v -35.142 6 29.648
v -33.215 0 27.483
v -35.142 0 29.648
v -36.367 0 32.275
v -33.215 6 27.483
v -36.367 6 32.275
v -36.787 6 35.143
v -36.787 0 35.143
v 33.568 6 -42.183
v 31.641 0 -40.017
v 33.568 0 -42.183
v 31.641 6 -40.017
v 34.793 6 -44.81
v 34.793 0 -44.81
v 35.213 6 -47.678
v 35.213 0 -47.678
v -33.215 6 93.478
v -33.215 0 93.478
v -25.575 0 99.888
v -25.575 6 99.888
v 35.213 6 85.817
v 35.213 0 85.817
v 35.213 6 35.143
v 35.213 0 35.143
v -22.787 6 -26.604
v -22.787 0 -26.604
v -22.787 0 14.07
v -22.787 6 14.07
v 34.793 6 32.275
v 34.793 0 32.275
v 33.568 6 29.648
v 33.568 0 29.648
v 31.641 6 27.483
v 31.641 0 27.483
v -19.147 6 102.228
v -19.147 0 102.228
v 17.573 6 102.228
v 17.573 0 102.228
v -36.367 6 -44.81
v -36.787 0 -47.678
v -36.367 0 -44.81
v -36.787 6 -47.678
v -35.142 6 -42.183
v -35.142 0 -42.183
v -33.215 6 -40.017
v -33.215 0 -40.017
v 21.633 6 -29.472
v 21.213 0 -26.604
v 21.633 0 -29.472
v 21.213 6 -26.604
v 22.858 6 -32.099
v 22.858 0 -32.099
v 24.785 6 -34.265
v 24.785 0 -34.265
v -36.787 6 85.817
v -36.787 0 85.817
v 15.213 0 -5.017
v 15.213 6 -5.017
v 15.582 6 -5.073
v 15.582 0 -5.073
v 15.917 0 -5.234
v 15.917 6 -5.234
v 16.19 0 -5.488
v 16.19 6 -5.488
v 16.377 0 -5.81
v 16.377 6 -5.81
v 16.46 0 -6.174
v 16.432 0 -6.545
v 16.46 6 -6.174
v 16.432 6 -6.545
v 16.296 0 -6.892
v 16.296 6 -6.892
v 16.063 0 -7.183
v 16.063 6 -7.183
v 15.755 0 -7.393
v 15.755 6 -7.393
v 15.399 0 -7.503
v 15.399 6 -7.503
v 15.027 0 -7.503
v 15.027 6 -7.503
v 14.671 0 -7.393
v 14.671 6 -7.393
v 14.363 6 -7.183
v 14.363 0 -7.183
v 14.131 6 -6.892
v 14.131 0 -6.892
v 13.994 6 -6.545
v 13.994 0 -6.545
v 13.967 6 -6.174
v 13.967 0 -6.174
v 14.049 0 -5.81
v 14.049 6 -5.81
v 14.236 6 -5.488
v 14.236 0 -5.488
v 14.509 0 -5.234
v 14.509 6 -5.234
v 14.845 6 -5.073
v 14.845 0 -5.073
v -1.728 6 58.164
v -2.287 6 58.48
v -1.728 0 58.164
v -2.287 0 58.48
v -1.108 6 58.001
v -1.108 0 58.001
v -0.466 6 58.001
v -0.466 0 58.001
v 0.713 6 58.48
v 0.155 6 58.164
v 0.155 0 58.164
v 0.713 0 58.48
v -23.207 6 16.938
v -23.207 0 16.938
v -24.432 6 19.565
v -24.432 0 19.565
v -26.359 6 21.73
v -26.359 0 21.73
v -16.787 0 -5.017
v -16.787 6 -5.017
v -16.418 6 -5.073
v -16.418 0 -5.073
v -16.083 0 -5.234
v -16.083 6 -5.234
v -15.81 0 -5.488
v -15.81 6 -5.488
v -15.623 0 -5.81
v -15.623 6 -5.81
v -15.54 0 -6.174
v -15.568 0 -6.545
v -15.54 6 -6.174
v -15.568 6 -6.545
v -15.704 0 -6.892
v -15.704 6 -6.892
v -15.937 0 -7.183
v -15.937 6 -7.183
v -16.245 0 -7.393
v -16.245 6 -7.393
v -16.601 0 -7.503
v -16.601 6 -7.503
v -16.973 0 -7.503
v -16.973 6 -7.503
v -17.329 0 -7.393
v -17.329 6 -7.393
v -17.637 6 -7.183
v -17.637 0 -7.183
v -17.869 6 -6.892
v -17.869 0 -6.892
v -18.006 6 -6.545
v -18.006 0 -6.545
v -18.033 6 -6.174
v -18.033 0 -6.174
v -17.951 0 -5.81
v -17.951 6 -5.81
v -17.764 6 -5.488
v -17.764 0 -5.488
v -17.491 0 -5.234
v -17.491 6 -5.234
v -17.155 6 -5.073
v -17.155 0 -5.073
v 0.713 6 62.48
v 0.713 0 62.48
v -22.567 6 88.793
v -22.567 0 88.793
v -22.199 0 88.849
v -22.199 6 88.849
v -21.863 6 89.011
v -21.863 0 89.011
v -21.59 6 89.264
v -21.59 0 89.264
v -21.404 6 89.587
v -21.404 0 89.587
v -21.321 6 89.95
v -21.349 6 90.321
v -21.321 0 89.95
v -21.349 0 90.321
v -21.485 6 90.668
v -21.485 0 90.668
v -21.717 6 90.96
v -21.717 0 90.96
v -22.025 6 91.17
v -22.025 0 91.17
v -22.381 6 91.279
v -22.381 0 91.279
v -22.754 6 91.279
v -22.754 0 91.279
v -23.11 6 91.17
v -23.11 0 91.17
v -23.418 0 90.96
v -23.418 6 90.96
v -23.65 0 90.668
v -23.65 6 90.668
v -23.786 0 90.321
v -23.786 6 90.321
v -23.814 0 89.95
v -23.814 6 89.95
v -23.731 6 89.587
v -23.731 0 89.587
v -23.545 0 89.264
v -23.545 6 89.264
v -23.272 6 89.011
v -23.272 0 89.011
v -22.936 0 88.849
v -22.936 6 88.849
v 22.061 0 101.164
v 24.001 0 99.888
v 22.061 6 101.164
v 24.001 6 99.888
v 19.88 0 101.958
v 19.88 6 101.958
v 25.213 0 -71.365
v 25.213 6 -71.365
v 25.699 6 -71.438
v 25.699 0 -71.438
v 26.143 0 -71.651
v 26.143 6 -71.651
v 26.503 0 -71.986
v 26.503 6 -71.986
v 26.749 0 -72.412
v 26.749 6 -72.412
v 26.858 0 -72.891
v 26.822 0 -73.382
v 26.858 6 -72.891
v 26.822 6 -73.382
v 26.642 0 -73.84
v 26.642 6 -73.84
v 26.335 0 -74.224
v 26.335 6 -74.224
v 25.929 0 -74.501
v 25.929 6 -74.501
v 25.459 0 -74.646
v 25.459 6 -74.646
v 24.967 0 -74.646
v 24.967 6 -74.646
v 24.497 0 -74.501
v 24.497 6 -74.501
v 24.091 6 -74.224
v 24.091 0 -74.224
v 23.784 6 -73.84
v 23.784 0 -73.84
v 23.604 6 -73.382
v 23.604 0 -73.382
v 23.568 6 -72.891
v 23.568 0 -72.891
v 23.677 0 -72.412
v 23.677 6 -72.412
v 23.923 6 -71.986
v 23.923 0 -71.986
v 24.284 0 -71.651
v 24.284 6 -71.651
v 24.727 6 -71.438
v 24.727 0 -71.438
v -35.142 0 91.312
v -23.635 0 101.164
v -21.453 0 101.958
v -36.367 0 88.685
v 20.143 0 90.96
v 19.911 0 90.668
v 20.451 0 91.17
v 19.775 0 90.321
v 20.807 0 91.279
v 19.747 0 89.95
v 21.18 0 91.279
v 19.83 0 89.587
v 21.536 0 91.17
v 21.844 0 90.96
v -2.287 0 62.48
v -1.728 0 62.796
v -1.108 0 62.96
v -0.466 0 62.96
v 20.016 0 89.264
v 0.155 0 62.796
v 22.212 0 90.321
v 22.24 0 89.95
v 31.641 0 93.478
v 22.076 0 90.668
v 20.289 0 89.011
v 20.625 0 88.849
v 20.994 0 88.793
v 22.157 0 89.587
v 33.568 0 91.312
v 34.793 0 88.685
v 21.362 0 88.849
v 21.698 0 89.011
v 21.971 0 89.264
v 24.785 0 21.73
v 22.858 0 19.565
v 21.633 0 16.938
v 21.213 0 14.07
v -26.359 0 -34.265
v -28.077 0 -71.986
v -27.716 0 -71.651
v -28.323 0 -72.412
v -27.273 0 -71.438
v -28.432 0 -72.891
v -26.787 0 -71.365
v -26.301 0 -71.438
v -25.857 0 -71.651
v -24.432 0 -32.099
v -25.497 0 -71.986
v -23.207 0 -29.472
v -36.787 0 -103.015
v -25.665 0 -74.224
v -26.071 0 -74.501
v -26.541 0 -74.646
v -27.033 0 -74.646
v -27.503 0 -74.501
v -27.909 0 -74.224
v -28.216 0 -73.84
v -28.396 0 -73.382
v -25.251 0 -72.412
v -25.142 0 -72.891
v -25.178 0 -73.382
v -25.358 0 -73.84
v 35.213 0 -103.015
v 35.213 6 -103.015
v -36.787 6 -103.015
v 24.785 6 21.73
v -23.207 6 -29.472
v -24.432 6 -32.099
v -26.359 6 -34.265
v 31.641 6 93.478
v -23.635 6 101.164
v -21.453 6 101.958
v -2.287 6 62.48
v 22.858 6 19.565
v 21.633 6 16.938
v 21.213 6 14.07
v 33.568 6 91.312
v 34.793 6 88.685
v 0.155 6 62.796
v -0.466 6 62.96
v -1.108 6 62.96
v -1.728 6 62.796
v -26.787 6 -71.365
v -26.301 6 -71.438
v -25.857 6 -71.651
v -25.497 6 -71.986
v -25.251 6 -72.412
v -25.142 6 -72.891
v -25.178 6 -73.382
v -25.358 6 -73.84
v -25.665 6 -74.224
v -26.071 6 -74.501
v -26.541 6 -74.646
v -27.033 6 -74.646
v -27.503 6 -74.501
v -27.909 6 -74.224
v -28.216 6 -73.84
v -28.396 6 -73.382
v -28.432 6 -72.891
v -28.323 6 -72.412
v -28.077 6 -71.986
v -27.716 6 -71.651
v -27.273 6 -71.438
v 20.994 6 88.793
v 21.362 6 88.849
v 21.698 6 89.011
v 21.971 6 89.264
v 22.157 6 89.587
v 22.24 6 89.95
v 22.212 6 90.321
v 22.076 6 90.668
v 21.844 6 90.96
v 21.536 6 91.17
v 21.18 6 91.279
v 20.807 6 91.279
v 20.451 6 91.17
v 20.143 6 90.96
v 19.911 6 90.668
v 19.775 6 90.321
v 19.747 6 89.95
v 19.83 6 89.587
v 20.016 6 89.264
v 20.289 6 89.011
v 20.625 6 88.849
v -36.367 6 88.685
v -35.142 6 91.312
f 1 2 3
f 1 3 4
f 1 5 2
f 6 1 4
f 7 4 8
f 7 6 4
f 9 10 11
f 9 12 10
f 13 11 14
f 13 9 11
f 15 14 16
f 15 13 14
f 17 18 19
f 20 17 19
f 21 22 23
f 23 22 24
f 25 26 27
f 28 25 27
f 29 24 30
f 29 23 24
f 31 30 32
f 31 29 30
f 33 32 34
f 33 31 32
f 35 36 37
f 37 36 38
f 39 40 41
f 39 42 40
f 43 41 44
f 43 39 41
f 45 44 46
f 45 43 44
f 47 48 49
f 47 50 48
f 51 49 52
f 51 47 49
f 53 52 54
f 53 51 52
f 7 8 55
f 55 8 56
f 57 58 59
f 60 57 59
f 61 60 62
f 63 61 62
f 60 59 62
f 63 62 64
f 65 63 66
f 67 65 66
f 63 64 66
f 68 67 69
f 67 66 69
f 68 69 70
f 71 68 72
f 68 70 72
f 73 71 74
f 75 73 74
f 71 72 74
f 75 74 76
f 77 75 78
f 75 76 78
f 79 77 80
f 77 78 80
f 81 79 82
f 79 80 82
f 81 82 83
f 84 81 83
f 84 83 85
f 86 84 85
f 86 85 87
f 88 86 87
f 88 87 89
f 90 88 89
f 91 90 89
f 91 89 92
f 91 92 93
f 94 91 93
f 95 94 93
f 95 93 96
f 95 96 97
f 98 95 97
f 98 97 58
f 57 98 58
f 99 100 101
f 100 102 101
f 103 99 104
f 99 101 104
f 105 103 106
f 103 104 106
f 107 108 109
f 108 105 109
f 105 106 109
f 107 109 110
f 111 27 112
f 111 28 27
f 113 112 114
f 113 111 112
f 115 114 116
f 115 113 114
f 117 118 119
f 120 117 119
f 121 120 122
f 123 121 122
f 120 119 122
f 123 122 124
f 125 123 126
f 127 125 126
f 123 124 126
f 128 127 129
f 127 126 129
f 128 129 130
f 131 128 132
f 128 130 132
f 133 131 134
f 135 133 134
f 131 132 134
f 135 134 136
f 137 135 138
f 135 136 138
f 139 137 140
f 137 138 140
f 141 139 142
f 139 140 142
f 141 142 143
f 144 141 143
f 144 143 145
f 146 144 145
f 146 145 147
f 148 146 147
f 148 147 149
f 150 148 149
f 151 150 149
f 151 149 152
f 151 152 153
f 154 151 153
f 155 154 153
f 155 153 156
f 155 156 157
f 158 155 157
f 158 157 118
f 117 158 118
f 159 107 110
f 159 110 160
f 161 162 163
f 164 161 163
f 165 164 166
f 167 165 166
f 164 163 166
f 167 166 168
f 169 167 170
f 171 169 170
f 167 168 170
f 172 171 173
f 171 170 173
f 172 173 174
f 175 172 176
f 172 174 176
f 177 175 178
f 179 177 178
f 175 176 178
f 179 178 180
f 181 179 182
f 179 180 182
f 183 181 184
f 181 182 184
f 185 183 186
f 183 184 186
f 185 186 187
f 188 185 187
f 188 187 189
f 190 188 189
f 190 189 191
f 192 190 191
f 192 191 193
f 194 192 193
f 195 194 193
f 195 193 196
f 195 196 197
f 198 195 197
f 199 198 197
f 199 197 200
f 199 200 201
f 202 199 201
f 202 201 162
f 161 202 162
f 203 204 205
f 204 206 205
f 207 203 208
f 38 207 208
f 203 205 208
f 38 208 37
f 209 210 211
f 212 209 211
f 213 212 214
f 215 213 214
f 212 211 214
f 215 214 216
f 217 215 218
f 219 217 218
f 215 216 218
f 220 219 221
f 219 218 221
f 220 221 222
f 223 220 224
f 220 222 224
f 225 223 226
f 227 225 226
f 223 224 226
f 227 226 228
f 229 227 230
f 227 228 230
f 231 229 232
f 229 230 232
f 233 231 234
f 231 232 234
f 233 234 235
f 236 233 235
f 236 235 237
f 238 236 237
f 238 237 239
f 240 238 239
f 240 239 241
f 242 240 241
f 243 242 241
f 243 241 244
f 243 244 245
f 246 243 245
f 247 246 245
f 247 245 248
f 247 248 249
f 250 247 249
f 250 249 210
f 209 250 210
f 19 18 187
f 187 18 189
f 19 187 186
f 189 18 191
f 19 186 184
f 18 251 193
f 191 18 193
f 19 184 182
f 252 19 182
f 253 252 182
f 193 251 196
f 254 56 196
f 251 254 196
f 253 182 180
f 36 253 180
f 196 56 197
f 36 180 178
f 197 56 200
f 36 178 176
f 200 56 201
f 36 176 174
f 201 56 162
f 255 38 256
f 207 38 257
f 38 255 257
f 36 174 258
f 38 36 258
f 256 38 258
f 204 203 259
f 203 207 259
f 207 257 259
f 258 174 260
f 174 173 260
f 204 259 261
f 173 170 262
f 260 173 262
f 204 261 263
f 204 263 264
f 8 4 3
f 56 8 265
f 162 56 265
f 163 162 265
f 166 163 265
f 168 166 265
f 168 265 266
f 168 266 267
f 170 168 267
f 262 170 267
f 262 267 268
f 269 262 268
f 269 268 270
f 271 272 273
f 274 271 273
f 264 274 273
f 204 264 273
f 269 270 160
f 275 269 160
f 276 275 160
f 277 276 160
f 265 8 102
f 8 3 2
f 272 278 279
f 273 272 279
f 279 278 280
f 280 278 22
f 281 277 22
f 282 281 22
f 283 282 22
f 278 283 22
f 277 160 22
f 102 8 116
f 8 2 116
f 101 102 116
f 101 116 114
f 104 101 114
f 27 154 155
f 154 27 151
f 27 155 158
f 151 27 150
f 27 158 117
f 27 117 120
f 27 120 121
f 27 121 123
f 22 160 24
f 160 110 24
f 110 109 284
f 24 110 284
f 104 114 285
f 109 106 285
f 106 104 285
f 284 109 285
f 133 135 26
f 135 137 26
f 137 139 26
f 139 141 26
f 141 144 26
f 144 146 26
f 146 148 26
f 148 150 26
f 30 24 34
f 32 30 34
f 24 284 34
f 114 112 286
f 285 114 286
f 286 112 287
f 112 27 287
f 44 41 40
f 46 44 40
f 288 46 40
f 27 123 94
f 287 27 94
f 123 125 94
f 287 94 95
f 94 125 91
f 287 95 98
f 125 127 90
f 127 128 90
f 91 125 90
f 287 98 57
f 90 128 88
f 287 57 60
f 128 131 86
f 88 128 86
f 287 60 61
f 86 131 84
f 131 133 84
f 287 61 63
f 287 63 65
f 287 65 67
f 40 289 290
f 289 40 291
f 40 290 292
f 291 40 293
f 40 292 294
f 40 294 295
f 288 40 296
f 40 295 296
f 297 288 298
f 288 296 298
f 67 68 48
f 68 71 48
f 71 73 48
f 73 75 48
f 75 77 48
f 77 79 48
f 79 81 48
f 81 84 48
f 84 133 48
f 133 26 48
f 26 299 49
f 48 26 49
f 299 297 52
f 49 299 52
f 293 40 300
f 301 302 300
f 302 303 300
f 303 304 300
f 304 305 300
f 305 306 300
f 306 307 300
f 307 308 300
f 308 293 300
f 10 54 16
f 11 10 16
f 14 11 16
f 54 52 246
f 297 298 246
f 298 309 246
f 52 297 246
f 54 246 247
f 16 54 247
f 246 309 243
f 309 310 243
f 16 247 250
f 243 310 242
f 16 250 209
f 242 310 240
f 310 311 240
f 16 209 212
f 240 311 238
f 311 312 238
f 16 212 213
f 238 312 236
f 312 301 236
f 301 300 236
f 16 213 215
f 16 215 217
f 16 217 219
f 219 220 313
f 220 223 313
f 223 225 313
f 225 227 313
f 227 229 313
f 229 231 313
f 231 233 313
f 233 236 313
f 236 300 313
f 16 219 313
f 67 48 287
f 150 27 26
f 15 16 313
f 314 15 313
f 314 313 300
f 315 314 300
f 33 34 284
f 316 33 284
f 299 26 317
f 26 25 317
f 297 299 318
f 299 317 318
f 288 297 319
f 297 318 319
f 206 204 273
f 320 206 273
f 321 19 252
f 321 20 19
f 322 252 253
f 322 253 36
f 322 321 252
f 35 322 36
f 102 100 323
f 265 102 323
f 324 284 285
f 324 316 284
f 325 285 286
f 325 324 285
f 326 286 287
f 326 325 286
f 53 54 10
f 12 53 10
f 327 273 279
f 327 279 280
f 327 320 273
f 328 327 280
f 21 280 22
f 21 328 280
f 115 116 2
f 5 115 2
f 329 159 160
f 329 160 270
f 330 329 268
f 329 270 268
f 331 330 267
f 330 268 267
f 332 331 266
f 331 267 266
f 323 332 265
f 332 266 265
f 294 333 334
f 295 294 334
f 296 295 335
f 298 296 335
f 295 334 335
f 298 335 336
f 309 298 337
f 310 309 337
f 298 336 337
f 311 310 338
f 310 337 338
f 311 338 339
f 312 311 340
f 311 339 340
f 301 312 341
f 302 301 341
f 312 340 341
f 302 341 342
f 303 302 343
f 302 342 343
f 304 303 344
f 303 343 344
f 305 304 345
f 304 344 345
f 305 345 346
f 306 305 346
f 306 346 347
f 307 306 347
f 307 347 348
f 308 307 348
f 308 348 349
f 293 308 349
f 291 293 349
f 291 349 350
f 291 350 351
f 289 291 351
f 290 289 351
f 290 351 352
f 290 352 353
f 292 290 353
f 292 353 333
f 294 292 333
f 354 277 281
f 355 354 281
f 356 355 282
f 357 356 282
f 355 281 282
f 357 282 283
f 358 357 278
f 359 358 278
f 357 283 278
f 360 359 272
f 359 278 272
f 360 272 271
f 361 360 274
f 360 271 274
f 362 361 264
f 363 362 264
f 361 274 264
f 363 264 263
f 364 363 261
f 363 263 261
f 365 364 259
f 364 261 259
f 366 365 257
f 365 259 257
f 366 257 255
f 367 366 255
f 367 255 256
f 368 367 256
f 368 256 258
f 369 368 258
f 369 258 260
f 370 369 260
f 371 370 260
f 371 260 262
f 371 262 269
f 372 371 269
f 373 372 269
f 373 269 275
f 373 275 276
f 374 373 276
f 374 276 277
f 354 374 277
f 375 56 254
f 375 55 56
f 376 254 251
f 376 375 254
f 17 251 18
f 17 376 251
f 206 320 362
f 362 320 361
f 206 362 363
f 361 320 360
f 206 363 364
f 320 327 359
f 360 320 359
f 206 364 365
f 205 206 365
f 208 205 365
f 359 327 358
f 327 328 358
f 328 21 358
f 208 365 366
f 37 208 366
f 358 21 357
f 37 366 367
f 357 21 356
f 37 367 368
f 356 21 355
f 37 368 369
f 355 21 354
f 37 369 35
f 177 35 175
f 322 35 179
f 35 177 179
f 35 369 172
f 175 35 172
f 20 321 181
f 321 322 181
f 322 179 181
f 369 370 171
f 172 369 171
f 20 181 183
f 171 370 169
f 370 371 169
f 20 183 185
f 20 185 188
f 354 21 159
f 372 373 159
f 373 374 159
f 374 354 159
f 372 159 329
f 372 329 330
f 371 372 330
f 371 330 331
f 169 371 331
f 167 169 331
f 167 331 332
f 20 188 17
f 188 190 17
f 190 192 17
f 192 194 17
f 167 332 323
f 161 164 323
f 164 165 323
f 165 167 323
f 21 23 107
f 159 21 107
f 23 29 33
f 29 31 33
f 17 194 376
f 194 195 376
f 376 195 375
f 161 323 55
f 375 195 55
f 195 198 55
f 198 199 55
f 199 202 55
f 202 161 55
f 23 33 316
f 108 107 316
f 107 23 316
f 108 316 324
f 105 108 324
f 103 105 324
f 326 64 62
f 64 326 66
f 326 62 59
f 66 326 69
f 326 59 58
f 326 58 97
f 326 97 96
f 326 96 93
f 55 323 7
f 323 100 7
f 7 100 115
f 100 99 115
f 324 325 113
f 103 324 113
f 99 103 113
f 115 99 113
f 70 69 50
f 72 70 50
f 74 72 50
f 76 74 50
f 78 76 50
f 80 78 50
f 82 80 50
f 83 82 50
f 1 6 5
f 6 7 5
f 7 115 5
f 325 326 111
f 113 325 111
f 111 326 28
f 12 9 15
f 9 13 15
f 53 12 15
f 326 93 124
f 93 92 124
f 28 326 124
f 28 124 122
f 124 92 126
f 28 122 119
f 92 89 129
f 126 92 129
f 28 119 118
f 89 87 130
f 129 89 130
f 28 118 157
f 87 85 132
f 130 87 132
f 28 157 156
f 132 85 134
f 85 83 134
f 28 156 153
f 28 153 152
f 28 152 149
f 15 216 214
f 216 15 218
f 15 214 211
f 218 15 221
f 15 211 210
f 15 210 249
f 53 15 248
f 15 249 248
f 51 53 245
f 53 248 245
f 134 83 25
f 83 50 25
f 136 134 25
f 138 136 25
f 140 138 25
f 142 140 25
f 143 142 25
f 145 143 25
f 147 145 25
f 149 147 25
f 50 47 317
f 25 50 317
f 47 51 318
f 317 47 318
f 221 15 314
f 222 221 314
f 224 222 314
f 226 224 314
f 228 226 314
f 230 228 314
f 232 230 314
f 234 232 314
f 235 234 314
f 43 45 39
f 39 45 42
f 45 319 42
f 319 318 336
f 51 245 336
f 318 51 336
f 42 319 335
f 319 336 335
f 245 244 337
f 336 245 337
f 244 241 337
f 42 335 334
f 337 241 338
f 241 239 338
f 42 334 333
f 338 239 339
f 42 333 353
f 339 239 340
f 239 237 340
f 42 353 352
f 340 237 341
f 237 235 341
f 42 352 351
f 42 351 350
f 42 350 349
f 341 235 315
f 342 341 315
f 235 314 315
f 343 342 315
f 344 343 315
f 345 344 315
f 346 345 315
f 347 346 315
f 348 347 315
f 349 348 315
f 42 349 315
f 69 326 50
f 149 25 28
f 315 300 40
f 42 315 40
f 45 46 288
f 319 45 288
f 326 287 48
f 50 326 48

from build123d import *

# Parameters (mm, degrees)
BOSS_EXTRUDE1_DEPTH = 6
FILLET1_R           = 10
SKETCH2_R           = 2.5
CUT_EXTRUDE1_DEPTH  = 6
FILLET2_R           = 10
SKETCH5_R           = 1.25
CUT_EXTRUDE2_DEPTH  = 10
SKETCH6_R           = 1.25
CUT_EXTRUDE3_DEPTH  = 10
SKETCH7_R           = 1.65
CUT_EXTRUDE4_DEPTH  = 10
BOSS_EXTRUDE2_DEPTH = 6


with BuildPart() as part:
    # Sketch1 → Boss-Extrude1 (new body)
    with BuildSketch(Plane(origin=(0, 0, 0), x_dir=(1, 0, 0), z_dir=(0, 1, 0))):
        Polygon((21.213083016, -102.227633762), (35.213083016, -90.480238926), (35.213083016, -30.480238926), (21.213083016, -18.73284409), (21.213083016, 31.26715591), (35.213083016, 43.014550747), (35.213083016, 103.014550747), (-36.786916984, 103.014550747), (-36.786916984, 43.014550747), (-22.786916984, 31.26715591), (-22.786916984, -18.73284409), (-36.786916984, -30.480238926), (-36.786916984, -90.480238926), (-22.786916984, -102.227633762), align=None)
    extrude(amount=BOSS_EXTRUDE1_DEPTH)

    # Fillet1
    fillet1_edges = [part.edges().sort_by_distance(p)[0] for p in [
        (-22.786916984, 3, 102.227633762),
        (-36.786916984, 3, 90.480238926),
        (-36.786916984, 3, 30.480238926),
        (-22.786916984, 3, 18.73284409),
        (21.213083016, 3, 18.73284409),
        (35.213083016, 3, 30.480238926),
        (35.213083016, 3, 90.480238926),
        (21.213083016, 3, 102.227633762),
    ]]
    fillet(fillet1_edges, radius=FILLET1_R)

    # Sketch2 → Cut-Extrude1 (cut)
    with BuildSketch(Plane.XZ):
        with Locations(Location((-0.786916984, 60.480238926, 0), (0, 0, 270))):
            Circle(SKETCH2_R)
    extrude(amount=-CUT_EXTRUDE1_DEPTH, mode=Mode.SUBTRACT)

    # Fillet2
    fillet2_edges = [part.edges().sort_by_distance(p)[0] for p in [
        (-22.786916984, 3, -31.26715591),
        (-36.786916984, 3, -43.014550747),
        (35.213083016, 3, -43.014550747),
        (21.213083016, 3, -31.26715591),
    ]]
    fillet(fillet2_edges, radius=FILLET2_R)

    # Sketch5 → Cut-Extrude2 (cut)
    with BuildSketch(Plane(origin=(0, 6, 0), x_dir=(1, 0, 0), z_dir=(0, 1, 0))):
        with Locations(Location((15.213083016, 6.26715591, 0), (0, 0, 270))):
            Circle(SKETCH5_R)
        with Locations(Location((-16.786916984, 6.26715591, 0), (0, 0, 270))):
            Circle(SKETCH5_R)
    extrude(amount=-CUT_EXTRUDE2_DEPTH, mode=Mode.SUBTRACT)

    # Sketch6 → Cut-Extrude3 (cut)
    with BuildSketch(Plane.XZ):
        with Locations(Location((-22.567416075, 90.043344962, 0), (0, 0, 270))):
            Circle(SKETCH6_R)
        with Locations(Location((20.993582106, 90.043344962, 0), (0, 0, 270))):
            Circle(SKETCH6_R)
    extrude(amount=-CUT_EXTRUDE3_DEPTH, mode=Mode.SUBTRACT)

    # Sketch7 → Cut-Extrude4 (cut)
    with BuildSketch(Plane(origin=(0, 6, 0), x_dir=(1, 0, 0), z_dir=(0, 1, 0))):
        with Locations(Location((25.213083016, 73.014550747, 0), (0, 0, 270))):
            Circle(SKETCH7_R)
        with Locations(Location((-26.786916984, 73.014550747, 0), (0, 0, 270))):
            Circle(SKETCH7_R)
    extrude(amount=-CUT_EXTRUDE4_DEPTH, mode=Mode.SUBTRACT)

    # Sketch8 → Boss-Extrude2 (add)
    with BuildSketch(Plane(origin=(0, 6, 0), x_dir=(1, 0, 0), z_dir=(0, 1, 0))):
        with BuildLine():
            Line((-2.286916984, -57.882162715), (-2.286916984, -63.078315137))
            ThreePointArc((-2.286916984, -63.078315137), (-3.786916984, -60.480238926), (-2.286916984, -57.882162715))
        make_face()
        with BuildLine():
            Line((0.713083016, -57.882162715), (0.713083016, -63.078315137))
            ThreePointArc((0.713083016, -63.078315137), (2.213083016, -60.480238926), (0.713083016, -57.882162715))
        make_face()
    extrude(amount=-BOSS_EXTRUDE2_DEPTH)


solid = part.part
